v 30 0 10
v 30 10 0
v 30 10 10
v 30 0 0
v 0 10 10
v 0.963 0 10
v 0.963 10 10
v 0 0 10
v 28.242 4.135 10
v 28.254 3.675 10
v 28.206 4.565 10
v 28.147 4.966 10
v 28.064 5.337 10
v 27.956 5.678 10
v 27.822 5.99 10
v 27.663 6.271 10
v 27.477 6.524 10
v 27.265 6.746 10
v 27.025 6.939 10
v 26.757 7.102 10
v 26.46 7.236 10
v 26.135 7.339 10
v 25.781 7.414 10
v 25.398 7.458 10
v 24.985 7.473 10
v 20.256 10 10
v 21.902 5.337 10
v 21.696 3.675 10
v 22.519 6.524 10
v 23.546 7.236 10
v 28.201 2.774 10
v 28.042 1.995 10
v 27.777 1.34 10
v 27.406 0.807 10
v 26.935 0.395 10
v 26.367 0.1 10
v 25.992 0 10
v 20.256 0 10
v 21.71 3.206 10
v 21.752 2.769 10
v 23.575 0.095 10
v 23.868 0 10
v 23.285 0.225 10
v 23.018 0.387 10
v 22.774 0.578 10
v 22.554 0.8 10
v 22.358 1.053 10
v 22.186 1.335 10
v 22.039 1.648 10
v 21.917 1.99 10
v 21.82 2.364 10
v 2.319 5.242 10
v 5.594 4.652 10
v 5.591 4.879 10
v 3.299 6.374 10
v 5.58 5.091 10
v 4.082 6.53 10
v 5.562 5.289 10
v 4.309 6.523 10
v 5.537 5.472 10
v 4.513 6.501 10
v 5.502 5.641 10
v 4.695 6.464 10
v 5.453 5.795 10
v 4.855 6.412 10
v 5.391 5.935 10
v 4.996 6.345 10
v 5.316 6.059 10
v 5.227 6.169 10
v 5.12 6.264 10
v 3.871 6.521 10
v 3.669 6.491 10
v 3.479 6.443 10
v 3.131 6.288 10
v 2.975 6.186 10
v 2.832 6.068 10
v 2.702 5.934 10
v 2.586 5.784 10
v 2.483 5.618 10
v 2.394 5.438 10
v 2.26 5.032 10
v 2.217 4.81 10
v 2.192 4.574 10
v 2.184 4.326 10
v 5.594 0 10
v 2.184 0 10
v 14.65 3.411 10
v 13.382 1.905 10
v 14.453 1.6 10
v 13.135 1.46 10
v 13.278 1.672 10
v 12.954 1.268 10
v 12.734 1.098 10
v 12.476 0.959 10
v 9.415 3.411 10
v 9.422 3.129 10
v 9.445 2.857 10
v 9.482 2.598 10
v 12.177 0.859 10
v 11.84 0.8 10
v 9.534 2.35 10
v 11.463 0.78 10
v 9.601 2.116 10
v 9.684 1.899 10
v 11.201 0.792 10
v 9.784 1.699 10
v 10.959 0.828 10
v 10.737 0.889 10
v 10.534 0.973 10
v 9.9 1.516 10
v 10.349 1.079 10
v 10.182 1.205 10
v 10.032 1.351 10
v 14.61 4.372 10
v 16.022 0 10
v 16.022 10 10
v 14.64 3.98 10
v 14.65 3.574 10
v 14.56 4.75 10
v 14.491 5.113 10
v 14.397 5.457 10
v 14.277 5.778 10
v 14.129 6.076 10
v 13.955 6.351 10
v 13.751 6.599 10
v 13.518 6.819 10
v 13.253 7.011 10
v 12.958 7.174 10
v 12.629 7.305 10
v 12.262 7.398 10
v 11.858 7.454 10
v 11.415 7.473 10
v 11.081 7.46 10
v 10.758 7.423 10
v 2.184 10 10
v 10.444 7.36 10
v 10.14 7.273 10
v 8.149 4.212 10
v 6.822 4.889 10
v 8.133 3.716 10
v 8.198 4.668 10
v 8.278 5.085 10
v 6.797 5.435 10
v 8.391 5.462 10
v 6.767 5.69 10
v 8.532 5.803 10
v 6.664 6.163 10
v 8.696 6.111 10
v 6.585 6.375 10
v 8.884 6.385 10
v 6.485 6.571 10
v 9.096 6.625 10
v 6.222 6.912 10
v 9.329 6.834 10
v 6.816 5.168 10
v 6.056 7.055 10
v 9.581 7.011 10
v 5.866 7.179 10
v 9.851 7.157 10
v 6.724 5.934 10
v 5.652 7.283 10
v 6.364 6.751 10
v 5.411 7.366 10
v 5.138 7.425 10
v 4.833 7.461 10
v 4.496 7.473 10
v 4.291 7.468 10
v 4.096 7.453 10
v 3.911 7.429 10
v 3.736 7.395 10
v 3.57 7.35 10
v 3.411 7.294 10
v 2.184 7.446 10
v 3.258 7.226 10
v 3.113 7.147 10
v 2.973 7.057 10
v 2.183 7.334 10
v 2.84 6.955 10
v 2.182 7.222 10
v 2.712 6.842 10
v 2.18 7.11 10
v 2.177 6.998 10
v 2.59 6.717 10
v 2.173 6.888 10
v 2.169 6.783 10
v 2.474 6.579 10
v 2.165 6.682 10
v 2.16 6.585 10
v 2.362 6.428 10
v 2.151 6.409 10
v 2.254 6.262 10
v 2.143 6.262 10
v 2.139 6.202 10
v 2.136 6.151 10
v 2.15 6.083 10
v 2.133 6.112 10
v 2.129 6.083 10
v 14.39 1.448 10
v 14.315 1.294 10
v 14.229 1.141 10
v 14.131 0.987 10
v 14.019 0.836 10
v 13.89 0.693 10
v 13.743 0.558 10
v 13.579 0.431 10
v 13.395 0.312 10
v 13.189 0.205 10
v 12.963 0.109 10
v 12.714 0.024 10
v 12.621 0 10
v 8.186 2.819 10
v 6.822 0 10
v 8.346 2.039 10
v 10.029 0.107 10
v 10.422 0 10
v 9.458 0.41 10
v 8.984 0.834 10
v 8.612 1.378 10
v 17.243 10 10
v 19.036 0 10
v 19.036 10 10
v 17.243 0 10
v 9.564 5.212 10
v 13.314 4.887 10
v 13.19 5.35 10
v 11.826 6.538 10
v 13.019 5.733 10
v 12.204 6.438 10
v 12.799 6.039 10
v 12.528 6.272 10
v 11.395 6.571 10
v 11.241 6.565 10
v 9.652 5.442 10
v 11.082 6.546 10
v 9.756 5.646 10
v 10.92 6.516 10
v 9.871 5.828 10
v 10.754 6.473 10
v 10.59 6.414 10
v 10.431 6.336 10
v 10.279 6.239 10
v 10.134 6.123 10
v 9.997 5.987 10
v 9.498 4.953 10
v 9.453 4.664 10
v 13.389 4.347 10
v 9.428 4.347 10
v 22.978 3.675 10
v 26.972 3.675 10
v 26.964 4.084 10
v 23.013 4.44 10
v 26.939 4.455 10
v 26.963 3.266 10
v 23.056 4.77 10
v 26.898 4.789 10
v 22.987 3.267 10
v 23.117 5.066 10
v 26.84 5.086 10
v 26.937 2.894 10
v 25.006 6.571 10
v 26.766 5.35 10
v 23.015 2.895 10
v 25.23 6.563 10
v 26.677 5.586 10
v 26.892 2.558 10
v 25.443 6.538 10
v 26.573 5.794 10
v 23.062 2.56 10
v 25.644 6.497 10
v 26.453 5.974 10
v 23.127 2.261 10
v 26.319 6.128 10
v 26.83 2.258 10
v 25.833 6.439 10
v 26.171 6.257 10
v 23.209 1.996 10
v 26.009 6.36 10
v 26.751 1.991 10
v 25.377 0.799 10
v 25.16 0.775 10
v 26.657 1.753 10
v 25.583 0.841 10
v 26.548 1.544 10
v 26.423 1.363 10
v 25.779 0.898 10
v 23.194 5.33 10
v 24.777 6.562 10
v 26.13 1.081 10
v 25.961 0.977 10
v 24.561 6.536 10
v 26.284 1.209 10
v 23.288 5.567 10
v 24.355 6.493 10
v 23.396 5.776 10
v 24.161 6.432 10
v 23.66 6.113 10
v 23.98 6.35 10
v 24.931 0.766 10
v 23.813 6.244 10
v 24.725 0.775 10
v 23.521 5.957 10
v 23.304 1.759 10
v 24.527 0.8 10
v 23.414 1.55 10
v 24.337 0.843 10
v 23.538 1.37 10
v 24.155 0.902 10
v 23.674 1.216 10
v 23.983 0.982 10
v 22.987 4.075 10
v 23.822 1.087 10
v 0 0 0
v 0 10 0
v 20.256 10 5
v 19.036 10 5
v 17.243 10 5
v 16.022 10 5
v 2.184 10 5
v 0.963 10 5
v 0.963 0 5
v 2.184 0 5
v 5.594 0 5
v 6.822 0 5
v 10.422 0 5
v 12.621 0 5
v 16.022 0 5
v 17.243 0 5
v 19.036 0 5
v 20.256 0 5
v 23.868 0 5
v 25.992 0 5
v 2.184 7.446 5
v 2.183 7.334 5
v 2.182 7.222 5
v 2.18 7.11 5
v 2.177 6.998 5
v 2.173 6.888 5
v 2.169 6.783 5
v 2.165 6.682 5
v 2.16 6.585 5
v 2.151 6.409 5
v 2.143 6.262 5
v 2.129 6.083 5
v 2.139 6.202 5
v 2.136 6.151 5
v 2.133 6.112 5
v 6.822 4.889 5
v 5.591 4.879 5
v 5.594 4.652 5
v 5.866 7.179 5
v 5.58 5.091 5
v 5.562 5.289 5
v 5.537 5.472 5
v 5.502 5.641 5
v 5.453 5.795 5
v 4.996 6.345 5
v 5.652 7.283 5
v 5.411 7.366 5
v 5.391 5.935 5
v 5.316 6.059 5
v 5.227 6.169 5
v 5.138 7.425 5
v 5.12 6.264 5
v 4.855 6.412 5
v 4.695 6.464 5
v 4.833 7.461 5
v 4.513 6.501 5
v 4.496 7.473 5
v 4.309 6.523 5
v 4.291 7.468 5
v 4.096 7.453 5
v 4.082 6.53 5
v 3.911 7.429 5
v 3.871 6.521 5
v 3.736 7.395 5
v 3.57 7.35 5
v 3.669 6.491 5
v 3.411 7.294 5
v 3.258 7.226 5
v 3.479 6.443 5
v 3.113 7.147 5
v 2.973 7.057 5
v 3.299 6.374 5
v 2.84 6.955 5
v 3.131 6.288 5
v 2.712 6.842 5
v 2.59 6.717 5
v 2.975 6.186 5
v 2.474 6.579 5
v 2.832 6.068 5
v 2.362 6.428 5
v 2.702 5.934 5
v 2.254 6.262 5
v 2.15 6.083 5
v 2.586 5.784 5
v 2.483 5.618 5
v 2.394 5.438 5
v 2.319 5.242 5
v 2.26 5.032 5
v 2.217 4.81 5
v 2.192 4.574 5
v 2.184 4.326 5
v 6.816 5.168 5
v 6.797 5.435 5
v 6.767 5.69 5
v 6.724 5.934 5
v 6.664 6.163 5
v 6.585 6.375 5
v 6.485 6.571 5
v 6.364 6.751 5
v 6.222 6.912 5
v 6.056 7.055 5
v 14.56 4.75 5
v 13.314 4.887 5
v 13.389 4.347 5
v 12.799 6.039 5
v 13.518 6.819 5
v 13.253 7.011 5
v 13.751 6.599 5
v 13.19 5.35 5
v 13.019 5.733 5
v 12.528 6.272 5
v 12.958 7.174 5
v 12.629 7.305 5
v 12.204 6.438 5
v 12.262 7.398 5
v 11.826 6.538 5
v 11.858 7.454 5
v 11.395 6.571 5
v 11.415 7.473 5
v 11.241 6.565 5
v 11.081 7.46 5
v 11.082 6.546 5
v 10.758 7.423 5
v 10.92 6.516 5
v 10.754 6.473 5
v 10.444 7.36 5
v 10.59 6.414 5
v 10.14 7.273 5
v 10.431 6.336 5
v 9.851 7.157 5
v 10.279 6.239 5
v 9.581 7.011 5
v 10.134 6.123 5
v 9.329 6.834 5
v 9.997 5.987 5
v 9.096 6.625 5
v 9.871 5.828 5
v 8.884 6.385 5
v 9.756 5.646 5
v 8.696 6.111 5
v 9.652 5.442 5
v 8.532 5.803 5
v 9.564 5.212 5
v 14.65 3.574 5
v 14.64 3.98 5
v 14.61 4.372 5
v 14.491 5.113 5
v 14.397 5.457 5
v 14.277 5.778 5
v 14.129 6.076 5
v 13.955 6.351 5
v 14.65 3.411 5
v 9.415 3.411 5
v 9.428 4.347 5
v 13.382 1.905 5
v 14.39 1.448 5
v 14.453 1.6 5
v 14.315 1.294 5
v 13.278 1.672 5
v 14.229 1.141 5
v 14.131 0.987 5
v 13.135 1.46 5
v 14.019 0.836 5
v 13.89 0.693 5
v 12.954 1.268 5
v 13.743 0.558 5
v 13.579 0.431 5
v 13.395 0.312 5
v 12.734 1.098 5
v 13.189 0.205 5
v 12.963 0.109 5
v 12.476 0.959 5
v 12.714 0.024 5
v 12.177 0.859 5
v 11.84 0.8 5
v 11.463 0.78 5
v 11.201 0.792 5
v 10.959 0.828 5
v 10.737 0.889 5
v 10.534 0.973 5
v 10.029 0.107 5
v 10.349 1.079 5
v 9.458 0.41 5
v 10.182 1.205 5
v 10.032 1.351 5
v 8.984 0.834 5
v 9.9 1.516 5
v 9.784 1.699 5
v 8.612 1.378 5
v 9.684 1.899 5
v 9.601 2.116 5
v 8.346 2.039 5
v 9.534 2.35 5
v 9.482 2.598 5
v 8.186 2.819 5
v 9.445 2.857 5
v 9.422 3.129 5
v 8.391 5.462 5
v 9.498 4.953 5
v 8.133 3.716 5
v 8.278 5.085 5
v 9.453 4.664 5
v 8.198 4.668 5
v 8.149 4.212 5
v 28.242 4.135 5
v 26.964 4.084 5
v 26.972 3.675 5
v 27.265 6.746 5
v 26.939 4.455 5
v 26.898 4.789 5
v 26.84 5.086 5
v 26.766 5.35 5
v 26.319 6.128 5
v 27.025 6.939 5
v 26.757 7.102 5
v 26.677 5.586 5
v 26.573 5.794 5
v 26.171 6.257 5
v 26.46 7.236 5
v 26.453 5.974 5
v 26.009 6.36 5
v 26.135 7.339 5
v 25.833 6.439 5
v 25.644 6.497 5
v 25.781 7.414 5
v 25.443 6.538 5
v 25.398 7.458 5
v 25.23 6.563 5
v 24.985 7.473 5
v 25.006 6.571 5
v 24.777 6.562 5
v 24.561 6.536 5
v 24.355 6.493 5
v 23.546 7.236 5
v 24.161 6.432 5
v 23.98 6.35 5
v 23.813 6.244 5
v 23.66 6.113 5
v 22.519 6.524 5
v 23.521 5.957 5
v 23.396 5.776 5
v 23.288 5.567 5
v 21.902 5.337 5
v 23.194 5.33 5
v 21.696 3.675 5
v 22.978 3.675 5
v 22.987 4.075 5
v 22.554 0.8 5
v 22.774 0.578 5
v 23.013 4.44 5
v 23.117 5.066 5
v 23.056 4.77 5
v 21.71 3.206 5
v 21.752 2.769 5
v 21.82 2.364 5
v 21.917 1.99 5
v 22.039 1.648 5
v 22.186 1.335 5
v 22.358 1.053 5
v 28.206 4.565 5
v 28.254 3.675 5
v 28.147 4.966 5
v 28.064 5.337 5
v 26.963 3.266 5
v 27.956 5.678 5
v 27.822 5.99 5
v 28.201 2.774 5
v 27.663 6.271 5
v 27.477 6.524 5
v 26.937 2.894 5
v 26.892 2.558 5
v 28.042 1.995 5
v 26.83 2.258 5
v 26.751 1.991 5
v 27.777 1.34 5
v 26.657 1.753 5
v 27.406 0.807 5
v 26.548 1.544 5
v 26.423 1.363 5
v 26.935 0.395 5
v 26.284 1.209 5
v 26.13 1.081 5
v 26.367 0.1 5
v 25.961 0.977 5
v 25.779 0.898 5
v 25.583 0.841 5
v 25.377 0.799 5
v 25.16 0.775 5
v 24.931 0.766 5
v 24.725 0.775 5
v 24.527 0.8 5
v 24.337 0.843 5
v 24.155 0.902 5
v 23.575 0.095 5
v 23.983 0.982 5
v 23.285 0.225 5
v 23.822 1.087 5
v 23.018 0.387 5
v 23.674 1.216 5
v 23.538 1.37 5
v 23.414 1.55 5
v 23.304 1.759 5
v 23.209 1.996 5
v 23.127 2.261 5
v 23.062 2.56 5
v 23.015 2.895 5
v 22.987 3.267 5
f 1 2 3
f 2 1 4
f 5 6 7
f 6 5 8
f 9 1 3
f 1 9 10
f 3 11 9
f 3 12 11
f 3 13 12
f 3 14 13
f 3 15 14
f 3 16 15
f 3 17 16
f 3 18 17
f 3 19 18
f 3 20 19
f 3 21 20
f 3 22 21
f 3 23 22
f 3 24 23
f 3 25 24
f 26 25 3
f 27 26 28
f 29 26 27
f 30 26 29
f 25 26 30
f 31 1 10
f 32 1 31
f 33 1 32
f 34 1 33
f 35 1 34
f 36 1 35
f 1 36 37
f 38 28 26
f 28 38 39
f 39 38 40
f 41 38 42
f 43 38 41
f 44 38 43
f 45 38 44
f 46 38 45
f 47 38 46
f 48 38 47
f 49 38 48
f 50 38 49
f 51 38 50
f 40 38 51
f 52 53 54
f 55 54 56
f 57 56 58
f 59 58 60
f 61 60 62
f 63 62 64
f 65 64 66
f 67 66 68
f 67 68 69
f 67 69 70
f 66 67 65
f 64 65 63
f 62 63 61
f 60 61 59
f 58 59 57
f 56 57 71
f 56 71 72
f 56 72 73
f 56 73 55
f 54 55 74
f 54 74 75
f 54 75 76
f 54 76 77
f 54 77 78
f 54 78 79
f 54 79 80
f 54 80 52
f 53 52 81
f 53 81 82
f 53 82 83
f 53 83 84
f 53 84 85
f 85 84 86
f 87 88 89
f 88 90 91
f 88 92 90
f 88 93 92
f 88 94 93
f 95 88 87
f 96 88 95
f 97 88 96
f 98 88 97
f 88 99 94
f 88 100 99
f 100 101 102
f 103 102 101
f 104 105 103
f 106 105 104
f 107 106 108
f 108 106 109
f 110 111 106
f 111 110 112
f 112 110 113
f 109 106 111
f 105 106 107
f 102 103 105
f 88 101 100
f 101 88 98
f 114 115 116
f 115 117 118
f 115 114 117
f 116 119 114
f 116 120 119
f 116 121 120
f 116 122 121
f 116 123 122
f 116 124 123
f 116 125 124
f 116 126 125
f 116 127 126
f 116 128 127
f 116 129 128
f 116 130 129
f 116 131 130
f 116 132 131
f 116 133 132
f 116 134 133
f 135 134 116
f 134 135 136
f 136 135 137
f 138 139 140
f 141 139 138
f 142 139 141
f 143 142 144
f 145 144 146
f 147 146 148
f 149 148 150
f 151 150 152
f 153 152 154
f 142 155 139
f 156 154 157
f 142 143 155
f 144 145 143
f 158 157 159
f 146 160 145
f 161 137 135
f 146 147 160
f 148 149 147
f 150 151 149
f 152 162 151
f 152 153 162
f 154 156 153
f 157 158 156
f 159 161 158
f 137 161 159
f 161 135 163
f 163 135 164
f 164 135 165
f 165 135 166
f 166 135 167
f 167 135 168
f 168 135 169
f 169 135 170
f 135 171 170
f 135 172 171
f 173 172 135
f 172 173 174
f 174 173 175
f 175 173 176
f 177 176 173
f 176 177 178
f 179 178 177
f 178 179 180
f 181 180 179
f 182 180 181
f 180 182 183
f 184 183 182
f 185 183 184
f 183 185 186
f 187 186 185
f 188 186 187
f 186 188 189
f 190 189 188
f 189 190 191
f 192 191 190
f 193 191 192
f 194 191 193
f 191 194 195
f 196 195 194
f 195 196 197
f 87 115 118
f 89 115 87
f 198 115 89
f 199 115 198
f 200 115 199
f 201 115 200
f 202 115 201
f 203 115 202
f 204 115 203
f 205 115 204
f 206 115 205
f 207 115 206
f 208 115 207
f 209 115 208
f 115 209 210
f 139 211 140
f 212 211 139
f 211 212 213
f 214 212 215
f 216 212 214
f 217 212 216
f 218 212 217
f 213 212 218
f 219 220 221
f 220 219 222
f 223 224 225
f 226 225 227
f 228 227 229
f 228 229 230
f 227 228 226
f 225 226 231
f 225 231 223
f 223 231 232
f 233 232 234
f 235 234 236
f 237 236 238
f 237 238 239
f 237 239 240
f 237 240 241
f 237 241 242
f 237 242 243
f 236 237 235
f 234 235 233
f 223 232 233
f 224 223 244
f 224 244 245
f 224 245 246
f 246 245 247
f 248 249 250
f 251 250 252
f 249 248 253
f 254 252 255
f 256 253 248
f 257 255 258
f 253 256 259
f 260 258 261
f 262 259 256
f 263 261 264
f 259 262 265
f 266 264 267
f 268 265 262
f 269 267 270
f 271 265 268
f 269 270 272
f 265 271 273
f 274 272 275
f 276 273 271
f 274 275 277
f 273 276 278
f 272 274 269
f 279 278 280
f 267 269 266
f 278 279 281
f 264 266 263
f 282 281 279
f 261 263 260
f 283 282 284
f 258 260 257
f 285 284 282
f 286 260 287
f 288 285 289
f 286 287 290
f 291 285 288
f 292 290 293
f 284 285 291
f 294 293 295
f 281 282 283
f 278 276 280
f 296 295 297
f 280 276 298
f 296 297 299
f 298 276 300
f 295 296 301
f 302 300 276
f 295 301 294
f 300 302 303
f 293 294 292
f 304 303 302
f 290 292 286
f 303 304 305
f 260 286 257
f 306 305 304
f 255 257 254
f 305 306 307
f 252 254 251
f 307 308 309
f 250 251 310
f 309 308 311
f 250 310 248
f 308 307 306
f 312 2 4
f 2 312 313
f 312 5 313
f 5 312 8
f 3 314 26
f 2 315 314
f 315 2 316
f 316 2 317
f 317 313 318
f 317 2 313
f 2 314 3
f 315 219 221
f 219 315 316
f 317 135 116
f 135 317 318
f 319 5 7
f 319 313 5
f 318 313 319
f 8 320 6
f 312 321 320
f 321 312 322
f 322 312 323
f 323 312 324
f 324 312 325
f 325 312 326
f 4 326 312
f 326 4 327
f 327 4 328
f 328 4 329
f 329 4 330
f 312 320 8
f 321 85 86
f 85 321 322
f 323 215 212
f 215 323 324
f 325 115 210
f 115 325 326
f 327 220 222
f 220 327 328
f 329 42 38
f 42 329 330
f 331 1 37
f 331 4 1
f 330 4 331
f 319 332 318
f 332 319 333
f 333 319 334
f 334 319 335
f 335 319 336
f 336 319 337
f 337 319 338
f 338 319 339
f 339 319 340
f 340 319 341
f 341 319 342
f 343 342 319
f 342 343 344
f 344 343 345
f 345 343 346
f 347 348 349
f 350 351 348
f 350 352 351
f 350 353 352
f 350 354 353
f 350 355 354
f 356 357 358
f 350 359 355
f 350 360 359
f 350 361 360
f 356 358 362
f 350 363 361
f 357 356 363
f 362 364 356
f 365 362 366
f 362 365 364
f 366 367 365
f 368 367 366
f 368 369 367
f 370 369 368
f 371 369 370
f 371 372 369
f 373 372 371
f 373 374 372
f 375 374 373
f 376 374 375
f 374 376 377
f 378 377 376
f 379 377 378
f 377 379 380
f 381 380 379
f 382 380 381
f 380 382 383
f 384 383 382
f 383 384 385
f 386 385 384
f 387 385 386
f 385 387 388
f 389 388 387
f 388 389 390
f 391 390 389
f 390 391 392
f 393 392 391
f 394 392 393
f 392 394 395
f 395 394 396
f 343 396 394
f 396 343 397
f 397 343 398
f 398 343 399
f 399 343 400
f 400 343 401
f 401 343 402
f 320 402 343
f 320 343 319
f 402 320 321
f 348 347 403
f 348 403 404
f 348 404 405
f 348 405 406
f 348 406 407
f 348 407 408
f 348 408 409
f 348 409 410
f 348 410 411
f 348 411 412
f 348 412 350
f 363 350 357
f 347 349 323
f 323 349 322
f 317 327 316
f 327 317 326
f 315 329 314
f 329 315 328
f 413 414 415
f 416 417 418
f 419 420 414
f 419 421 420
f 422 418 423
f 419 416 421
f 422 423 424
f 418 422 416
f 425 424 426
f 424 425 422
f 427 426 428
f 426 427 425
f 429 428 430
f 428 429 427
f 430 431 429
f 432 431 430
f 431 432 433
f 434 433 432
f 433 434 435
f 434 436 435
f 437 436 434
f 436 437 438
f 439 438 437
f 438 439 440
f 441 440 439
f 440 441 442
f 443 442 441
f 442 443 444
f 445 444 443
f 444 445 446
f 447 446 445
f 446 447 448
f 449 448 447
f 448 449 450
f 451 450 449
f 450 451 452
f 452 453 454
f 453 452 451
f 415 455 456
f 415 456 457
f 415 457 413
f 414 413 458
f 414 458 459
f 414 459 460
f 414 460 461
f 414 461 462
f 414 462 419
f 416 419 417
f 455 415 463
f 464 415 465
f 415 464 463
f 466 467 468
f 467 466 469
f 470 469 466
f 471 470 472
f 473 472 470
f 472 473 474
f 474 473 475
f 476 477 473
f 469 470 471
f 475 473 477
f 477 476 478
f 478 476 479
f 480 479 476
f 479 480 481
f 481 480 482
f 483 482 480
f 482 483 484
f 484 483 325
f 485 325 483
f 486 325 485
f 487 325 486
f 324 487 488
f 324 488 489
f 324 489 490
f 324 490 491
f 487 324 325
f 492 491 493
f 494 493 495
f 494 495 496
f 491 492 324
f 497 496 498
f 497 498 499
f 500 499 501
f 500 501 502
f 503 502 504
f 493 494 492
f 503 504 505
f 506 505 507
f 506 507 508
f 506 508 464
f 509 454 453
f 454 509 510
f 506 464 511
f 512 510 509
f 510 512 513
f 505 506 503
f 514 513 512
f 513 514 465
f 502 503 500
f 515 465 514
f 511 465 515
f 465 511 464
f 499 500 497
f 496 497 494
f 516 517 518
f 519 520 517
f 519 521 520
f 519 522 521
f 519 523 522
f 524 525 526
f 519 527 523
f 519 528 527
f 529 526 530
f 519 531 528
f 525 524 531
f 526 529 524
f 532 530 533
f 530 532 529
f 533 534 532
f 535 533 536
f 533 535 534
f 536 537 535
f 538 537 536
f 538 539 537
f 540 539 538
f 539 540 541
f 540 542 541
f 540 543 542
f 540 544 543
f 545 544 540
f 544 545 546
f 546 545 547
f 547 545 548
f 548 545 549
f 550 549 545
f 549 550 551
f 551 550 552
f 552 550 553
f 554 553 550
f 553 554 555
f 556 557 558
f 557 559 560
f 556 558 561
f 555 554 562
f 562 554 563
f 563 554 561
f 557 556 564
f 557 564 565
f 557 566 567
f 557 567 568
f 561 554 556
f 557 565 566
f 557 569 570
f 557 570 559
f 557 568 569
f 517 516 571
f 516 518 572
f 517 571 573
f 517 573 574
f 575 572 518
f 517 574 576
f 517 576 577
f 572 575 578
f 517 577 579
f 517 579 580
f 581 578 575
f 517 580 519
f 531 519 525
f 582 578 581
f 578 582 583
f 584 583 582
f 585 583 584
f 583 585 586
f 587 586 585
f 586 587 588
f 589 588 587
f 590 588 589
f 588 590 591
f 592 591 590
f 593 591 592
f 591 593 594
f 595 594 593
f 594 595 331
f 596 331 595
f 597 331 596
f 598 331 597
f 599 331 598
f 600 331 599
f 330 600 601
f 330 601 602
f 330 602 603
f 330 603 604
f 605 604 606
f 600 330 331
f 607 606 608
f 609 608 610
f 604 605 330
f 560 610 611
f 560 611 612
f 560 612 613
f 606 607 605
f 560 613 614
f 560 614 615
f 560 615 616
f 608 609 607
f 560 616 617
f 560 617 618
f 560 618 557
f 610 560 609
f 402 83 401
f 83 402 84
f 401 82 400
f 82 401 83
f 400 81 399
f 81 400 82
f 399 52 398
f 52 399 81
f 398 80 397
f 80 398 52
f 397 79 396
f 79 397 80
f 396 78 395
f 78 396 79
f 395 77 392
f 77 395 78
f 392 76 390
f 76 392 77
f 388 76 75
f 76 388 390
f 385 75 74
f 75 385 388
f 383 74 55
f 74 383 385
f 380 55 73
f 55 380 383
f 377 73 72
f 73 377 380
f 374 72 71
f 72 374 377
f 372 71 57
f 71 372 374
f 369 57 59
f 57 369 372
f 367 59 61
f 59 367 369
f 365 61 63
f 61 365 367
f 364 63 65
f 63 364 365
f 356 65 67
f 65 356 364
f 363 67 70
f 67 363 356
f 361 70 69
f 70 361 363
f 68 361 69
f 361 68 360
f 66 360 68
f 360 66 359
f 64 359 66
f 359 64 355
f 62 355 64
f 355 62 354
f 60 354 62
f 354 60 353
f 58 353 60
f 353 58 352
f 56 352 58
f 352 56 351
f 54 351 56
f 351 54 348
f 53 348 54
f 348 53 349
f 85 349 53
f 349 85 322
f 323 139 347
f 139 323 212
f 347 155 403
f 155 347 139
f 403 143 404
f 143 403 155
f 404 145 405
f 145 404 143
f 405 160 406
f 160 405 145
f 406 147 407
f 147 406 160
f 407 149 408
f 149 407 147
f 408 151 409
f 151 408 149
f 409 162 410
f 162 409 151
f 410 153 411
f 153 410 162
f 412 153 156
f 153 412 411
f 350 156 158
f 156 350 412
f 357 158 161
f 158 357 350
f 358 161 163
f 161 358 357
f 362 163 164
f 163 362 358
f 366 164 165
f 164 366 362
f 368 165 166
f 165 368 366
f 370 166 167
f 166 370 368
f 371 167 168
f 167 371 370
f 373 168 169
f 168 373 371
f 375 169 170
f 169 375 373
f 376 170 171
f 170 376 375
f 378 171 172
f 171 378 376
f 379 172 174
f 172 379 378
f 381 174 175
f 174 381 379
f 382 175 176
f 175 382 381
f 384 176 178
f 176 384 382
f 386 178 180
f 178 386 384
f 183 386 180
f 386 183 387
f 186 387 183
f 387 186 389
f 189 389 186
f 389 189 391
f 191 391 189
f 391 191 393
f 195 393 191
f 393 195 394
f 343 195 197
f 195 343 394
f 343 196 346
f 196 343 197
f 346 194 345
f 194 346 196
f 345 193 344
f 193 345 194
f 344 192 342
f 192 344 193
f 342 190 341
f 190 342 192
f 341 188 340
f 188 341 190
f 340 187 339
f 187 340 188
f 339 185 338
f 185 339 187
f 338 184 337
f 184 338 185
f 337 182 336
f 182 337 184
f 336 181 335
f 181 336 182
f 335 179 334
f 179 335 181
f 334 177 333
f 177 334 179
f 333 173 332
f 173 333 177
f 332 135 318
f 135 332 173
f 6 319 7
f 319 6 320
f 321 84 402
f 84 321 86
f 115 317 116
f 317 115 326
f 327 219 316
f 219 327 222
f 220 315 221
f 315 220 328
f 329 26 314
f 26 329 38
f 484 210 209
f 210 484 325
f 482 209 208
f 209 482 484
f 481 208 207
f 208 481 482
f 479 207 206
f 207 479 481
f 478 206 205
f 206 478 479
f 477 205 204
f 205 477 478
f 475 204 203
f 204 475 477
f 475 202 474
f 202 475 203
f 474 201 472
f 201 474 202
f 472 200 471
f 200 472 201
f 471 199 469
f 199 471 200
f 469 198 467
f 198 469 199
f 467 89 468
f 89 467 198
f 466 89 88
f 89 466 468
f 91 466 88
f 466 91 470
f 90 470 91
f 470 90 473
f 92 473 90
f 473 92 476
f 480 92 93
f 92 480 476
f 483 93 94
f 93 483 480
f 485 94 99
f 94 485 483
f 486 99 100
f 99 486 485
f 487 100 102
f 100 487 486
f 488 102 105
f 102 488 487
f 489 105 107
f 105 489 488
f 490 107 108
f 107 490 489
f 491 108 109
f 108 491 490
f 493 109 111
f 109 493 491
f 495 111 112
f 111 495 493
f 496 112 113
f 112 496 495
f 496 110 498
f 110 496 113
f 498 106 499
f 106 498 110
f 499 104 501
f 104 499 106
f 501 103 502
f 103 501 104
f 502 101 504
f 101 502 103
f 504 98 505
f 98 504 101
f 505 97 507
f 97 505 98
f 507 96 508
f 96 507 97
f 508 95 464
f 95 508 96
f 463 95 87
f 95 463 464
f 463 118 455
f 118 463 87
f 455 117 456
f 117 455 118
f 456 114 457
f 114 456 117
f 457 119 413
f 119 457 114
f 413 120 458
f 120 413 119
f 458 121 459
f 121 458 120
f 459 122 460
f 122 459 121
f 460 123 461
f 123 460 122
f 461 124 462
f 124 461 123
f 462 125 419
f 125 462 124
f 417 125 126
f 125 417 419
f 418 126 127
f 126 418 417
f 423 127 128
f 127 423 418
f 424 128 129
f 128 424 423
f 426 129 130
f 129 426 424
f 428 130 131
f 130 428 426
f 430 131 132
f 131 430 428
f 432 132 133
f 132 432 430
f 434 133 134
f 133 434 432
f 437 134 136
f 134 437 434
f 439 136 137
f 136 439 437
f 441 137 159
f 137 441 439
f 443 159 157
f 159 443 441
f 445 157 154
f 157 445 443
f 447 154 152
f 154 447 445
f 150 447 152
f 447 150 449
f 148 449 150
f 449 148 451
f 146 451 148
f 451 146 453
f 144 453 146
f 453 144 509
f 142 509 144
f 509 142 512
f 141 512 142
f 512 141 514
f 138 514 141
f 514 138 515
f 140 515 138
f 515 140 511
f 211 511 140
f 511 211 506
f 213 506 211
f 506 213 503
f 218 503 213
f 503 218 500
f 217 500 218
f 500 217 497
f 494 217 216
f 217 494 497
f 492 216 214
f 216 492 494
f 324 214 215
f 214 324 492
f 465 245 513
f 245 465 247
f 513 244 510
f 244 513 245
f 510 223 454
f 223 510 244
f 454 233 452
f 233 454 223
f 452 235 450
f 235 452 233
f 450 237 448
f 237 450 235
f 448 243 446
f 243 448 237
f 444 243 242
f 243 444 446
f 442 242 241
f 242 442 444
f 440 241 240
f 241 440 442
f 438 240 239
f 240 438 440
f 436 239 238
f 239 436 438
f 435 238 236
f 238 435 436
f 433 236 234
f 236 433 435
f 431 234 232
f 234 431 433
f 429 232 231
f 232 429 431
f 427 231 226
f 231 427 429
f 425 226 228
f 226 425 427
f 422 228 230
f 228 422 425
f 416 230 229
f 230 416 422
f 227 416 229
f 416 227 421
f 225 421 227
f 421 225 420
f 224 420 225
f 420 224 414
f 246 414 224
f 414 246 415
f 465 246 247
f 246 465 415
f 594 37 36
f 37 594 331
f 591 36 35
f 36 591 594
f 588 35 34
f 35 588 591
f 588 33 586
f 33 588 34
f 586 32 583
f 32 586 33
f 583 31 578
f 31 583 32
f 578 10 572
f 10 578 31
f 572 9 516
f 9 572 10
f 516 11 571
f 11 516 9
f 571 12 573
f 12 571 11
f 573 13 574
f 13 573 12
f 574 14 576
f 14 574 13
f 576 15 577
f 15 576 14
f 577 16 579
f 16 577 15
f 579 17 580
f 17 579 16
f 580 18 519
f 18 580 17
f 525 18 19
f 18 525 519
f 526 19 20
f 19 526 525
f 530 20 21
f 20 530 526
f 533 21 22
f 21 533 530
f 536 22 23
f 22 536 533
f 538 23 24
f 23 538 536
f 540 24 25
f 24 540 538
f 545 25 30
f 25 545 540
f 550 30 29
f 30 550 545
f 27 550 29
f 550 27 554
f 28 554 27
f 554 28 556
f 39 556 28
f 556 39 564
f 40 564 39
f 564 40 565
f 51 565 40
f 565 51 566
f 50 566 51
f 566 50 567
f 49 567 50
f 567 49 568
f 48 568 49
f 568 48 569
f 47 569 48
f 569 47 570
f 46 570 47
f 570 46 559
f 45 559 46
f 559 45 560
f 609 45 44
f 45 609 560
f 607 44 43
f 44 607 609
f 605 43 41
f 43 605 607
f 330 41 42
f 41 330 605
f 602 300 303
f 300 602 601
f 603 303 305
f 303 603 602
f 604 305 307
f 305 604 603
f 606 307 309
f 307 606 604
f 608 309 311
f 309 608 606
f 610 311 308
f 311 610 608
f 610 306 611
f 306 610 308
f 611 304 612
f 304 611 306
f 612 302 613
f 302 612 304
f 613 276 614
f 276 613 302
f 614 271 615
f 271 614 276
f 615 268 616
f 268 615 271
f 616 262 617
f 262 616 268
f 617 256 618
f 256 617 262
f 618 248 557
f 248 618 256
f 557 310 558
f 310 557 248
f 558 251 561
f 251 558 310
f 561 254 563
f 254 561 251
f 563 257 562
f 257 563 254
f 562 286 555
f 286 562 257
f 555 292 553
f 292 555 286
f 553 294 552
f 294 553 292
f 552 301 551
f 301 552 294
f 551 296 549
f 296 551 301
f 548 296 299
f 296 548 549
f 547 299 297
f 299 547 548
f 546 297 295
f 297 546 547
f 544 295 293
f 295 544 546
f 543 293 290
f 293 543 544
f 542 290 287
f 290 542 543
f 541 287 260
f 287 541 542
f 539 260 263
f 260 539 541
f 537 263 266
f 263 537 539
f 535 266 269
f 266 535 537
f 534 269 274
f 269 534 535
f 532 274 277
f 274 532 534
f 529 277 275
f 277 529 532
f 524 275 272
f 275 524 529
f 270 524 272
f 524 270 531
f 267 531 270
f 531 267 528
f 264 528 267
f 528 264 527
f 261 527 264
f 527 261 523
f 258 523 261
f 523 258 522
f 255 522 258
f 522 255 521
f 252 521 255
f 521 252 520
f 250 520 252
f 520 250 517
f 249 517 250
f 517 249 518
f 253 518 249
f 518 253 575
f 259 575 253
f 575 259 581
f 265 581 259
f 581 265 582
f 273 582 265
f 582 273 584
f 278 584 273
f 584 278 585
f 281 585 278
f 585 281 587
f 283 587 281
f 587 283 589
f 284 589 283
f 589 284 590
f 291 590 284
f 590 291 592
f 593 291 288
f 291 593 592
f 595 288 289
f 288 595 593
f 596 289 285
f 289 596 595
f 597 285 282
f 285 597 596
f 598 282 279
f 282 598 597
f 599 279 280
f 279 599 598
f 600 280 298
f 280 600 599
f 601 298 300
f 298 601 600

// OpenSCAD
difference() {
  cube([30,10,10]);
  translate([0,0,5]) linear_extrude(5.01)  text("hello");
}
